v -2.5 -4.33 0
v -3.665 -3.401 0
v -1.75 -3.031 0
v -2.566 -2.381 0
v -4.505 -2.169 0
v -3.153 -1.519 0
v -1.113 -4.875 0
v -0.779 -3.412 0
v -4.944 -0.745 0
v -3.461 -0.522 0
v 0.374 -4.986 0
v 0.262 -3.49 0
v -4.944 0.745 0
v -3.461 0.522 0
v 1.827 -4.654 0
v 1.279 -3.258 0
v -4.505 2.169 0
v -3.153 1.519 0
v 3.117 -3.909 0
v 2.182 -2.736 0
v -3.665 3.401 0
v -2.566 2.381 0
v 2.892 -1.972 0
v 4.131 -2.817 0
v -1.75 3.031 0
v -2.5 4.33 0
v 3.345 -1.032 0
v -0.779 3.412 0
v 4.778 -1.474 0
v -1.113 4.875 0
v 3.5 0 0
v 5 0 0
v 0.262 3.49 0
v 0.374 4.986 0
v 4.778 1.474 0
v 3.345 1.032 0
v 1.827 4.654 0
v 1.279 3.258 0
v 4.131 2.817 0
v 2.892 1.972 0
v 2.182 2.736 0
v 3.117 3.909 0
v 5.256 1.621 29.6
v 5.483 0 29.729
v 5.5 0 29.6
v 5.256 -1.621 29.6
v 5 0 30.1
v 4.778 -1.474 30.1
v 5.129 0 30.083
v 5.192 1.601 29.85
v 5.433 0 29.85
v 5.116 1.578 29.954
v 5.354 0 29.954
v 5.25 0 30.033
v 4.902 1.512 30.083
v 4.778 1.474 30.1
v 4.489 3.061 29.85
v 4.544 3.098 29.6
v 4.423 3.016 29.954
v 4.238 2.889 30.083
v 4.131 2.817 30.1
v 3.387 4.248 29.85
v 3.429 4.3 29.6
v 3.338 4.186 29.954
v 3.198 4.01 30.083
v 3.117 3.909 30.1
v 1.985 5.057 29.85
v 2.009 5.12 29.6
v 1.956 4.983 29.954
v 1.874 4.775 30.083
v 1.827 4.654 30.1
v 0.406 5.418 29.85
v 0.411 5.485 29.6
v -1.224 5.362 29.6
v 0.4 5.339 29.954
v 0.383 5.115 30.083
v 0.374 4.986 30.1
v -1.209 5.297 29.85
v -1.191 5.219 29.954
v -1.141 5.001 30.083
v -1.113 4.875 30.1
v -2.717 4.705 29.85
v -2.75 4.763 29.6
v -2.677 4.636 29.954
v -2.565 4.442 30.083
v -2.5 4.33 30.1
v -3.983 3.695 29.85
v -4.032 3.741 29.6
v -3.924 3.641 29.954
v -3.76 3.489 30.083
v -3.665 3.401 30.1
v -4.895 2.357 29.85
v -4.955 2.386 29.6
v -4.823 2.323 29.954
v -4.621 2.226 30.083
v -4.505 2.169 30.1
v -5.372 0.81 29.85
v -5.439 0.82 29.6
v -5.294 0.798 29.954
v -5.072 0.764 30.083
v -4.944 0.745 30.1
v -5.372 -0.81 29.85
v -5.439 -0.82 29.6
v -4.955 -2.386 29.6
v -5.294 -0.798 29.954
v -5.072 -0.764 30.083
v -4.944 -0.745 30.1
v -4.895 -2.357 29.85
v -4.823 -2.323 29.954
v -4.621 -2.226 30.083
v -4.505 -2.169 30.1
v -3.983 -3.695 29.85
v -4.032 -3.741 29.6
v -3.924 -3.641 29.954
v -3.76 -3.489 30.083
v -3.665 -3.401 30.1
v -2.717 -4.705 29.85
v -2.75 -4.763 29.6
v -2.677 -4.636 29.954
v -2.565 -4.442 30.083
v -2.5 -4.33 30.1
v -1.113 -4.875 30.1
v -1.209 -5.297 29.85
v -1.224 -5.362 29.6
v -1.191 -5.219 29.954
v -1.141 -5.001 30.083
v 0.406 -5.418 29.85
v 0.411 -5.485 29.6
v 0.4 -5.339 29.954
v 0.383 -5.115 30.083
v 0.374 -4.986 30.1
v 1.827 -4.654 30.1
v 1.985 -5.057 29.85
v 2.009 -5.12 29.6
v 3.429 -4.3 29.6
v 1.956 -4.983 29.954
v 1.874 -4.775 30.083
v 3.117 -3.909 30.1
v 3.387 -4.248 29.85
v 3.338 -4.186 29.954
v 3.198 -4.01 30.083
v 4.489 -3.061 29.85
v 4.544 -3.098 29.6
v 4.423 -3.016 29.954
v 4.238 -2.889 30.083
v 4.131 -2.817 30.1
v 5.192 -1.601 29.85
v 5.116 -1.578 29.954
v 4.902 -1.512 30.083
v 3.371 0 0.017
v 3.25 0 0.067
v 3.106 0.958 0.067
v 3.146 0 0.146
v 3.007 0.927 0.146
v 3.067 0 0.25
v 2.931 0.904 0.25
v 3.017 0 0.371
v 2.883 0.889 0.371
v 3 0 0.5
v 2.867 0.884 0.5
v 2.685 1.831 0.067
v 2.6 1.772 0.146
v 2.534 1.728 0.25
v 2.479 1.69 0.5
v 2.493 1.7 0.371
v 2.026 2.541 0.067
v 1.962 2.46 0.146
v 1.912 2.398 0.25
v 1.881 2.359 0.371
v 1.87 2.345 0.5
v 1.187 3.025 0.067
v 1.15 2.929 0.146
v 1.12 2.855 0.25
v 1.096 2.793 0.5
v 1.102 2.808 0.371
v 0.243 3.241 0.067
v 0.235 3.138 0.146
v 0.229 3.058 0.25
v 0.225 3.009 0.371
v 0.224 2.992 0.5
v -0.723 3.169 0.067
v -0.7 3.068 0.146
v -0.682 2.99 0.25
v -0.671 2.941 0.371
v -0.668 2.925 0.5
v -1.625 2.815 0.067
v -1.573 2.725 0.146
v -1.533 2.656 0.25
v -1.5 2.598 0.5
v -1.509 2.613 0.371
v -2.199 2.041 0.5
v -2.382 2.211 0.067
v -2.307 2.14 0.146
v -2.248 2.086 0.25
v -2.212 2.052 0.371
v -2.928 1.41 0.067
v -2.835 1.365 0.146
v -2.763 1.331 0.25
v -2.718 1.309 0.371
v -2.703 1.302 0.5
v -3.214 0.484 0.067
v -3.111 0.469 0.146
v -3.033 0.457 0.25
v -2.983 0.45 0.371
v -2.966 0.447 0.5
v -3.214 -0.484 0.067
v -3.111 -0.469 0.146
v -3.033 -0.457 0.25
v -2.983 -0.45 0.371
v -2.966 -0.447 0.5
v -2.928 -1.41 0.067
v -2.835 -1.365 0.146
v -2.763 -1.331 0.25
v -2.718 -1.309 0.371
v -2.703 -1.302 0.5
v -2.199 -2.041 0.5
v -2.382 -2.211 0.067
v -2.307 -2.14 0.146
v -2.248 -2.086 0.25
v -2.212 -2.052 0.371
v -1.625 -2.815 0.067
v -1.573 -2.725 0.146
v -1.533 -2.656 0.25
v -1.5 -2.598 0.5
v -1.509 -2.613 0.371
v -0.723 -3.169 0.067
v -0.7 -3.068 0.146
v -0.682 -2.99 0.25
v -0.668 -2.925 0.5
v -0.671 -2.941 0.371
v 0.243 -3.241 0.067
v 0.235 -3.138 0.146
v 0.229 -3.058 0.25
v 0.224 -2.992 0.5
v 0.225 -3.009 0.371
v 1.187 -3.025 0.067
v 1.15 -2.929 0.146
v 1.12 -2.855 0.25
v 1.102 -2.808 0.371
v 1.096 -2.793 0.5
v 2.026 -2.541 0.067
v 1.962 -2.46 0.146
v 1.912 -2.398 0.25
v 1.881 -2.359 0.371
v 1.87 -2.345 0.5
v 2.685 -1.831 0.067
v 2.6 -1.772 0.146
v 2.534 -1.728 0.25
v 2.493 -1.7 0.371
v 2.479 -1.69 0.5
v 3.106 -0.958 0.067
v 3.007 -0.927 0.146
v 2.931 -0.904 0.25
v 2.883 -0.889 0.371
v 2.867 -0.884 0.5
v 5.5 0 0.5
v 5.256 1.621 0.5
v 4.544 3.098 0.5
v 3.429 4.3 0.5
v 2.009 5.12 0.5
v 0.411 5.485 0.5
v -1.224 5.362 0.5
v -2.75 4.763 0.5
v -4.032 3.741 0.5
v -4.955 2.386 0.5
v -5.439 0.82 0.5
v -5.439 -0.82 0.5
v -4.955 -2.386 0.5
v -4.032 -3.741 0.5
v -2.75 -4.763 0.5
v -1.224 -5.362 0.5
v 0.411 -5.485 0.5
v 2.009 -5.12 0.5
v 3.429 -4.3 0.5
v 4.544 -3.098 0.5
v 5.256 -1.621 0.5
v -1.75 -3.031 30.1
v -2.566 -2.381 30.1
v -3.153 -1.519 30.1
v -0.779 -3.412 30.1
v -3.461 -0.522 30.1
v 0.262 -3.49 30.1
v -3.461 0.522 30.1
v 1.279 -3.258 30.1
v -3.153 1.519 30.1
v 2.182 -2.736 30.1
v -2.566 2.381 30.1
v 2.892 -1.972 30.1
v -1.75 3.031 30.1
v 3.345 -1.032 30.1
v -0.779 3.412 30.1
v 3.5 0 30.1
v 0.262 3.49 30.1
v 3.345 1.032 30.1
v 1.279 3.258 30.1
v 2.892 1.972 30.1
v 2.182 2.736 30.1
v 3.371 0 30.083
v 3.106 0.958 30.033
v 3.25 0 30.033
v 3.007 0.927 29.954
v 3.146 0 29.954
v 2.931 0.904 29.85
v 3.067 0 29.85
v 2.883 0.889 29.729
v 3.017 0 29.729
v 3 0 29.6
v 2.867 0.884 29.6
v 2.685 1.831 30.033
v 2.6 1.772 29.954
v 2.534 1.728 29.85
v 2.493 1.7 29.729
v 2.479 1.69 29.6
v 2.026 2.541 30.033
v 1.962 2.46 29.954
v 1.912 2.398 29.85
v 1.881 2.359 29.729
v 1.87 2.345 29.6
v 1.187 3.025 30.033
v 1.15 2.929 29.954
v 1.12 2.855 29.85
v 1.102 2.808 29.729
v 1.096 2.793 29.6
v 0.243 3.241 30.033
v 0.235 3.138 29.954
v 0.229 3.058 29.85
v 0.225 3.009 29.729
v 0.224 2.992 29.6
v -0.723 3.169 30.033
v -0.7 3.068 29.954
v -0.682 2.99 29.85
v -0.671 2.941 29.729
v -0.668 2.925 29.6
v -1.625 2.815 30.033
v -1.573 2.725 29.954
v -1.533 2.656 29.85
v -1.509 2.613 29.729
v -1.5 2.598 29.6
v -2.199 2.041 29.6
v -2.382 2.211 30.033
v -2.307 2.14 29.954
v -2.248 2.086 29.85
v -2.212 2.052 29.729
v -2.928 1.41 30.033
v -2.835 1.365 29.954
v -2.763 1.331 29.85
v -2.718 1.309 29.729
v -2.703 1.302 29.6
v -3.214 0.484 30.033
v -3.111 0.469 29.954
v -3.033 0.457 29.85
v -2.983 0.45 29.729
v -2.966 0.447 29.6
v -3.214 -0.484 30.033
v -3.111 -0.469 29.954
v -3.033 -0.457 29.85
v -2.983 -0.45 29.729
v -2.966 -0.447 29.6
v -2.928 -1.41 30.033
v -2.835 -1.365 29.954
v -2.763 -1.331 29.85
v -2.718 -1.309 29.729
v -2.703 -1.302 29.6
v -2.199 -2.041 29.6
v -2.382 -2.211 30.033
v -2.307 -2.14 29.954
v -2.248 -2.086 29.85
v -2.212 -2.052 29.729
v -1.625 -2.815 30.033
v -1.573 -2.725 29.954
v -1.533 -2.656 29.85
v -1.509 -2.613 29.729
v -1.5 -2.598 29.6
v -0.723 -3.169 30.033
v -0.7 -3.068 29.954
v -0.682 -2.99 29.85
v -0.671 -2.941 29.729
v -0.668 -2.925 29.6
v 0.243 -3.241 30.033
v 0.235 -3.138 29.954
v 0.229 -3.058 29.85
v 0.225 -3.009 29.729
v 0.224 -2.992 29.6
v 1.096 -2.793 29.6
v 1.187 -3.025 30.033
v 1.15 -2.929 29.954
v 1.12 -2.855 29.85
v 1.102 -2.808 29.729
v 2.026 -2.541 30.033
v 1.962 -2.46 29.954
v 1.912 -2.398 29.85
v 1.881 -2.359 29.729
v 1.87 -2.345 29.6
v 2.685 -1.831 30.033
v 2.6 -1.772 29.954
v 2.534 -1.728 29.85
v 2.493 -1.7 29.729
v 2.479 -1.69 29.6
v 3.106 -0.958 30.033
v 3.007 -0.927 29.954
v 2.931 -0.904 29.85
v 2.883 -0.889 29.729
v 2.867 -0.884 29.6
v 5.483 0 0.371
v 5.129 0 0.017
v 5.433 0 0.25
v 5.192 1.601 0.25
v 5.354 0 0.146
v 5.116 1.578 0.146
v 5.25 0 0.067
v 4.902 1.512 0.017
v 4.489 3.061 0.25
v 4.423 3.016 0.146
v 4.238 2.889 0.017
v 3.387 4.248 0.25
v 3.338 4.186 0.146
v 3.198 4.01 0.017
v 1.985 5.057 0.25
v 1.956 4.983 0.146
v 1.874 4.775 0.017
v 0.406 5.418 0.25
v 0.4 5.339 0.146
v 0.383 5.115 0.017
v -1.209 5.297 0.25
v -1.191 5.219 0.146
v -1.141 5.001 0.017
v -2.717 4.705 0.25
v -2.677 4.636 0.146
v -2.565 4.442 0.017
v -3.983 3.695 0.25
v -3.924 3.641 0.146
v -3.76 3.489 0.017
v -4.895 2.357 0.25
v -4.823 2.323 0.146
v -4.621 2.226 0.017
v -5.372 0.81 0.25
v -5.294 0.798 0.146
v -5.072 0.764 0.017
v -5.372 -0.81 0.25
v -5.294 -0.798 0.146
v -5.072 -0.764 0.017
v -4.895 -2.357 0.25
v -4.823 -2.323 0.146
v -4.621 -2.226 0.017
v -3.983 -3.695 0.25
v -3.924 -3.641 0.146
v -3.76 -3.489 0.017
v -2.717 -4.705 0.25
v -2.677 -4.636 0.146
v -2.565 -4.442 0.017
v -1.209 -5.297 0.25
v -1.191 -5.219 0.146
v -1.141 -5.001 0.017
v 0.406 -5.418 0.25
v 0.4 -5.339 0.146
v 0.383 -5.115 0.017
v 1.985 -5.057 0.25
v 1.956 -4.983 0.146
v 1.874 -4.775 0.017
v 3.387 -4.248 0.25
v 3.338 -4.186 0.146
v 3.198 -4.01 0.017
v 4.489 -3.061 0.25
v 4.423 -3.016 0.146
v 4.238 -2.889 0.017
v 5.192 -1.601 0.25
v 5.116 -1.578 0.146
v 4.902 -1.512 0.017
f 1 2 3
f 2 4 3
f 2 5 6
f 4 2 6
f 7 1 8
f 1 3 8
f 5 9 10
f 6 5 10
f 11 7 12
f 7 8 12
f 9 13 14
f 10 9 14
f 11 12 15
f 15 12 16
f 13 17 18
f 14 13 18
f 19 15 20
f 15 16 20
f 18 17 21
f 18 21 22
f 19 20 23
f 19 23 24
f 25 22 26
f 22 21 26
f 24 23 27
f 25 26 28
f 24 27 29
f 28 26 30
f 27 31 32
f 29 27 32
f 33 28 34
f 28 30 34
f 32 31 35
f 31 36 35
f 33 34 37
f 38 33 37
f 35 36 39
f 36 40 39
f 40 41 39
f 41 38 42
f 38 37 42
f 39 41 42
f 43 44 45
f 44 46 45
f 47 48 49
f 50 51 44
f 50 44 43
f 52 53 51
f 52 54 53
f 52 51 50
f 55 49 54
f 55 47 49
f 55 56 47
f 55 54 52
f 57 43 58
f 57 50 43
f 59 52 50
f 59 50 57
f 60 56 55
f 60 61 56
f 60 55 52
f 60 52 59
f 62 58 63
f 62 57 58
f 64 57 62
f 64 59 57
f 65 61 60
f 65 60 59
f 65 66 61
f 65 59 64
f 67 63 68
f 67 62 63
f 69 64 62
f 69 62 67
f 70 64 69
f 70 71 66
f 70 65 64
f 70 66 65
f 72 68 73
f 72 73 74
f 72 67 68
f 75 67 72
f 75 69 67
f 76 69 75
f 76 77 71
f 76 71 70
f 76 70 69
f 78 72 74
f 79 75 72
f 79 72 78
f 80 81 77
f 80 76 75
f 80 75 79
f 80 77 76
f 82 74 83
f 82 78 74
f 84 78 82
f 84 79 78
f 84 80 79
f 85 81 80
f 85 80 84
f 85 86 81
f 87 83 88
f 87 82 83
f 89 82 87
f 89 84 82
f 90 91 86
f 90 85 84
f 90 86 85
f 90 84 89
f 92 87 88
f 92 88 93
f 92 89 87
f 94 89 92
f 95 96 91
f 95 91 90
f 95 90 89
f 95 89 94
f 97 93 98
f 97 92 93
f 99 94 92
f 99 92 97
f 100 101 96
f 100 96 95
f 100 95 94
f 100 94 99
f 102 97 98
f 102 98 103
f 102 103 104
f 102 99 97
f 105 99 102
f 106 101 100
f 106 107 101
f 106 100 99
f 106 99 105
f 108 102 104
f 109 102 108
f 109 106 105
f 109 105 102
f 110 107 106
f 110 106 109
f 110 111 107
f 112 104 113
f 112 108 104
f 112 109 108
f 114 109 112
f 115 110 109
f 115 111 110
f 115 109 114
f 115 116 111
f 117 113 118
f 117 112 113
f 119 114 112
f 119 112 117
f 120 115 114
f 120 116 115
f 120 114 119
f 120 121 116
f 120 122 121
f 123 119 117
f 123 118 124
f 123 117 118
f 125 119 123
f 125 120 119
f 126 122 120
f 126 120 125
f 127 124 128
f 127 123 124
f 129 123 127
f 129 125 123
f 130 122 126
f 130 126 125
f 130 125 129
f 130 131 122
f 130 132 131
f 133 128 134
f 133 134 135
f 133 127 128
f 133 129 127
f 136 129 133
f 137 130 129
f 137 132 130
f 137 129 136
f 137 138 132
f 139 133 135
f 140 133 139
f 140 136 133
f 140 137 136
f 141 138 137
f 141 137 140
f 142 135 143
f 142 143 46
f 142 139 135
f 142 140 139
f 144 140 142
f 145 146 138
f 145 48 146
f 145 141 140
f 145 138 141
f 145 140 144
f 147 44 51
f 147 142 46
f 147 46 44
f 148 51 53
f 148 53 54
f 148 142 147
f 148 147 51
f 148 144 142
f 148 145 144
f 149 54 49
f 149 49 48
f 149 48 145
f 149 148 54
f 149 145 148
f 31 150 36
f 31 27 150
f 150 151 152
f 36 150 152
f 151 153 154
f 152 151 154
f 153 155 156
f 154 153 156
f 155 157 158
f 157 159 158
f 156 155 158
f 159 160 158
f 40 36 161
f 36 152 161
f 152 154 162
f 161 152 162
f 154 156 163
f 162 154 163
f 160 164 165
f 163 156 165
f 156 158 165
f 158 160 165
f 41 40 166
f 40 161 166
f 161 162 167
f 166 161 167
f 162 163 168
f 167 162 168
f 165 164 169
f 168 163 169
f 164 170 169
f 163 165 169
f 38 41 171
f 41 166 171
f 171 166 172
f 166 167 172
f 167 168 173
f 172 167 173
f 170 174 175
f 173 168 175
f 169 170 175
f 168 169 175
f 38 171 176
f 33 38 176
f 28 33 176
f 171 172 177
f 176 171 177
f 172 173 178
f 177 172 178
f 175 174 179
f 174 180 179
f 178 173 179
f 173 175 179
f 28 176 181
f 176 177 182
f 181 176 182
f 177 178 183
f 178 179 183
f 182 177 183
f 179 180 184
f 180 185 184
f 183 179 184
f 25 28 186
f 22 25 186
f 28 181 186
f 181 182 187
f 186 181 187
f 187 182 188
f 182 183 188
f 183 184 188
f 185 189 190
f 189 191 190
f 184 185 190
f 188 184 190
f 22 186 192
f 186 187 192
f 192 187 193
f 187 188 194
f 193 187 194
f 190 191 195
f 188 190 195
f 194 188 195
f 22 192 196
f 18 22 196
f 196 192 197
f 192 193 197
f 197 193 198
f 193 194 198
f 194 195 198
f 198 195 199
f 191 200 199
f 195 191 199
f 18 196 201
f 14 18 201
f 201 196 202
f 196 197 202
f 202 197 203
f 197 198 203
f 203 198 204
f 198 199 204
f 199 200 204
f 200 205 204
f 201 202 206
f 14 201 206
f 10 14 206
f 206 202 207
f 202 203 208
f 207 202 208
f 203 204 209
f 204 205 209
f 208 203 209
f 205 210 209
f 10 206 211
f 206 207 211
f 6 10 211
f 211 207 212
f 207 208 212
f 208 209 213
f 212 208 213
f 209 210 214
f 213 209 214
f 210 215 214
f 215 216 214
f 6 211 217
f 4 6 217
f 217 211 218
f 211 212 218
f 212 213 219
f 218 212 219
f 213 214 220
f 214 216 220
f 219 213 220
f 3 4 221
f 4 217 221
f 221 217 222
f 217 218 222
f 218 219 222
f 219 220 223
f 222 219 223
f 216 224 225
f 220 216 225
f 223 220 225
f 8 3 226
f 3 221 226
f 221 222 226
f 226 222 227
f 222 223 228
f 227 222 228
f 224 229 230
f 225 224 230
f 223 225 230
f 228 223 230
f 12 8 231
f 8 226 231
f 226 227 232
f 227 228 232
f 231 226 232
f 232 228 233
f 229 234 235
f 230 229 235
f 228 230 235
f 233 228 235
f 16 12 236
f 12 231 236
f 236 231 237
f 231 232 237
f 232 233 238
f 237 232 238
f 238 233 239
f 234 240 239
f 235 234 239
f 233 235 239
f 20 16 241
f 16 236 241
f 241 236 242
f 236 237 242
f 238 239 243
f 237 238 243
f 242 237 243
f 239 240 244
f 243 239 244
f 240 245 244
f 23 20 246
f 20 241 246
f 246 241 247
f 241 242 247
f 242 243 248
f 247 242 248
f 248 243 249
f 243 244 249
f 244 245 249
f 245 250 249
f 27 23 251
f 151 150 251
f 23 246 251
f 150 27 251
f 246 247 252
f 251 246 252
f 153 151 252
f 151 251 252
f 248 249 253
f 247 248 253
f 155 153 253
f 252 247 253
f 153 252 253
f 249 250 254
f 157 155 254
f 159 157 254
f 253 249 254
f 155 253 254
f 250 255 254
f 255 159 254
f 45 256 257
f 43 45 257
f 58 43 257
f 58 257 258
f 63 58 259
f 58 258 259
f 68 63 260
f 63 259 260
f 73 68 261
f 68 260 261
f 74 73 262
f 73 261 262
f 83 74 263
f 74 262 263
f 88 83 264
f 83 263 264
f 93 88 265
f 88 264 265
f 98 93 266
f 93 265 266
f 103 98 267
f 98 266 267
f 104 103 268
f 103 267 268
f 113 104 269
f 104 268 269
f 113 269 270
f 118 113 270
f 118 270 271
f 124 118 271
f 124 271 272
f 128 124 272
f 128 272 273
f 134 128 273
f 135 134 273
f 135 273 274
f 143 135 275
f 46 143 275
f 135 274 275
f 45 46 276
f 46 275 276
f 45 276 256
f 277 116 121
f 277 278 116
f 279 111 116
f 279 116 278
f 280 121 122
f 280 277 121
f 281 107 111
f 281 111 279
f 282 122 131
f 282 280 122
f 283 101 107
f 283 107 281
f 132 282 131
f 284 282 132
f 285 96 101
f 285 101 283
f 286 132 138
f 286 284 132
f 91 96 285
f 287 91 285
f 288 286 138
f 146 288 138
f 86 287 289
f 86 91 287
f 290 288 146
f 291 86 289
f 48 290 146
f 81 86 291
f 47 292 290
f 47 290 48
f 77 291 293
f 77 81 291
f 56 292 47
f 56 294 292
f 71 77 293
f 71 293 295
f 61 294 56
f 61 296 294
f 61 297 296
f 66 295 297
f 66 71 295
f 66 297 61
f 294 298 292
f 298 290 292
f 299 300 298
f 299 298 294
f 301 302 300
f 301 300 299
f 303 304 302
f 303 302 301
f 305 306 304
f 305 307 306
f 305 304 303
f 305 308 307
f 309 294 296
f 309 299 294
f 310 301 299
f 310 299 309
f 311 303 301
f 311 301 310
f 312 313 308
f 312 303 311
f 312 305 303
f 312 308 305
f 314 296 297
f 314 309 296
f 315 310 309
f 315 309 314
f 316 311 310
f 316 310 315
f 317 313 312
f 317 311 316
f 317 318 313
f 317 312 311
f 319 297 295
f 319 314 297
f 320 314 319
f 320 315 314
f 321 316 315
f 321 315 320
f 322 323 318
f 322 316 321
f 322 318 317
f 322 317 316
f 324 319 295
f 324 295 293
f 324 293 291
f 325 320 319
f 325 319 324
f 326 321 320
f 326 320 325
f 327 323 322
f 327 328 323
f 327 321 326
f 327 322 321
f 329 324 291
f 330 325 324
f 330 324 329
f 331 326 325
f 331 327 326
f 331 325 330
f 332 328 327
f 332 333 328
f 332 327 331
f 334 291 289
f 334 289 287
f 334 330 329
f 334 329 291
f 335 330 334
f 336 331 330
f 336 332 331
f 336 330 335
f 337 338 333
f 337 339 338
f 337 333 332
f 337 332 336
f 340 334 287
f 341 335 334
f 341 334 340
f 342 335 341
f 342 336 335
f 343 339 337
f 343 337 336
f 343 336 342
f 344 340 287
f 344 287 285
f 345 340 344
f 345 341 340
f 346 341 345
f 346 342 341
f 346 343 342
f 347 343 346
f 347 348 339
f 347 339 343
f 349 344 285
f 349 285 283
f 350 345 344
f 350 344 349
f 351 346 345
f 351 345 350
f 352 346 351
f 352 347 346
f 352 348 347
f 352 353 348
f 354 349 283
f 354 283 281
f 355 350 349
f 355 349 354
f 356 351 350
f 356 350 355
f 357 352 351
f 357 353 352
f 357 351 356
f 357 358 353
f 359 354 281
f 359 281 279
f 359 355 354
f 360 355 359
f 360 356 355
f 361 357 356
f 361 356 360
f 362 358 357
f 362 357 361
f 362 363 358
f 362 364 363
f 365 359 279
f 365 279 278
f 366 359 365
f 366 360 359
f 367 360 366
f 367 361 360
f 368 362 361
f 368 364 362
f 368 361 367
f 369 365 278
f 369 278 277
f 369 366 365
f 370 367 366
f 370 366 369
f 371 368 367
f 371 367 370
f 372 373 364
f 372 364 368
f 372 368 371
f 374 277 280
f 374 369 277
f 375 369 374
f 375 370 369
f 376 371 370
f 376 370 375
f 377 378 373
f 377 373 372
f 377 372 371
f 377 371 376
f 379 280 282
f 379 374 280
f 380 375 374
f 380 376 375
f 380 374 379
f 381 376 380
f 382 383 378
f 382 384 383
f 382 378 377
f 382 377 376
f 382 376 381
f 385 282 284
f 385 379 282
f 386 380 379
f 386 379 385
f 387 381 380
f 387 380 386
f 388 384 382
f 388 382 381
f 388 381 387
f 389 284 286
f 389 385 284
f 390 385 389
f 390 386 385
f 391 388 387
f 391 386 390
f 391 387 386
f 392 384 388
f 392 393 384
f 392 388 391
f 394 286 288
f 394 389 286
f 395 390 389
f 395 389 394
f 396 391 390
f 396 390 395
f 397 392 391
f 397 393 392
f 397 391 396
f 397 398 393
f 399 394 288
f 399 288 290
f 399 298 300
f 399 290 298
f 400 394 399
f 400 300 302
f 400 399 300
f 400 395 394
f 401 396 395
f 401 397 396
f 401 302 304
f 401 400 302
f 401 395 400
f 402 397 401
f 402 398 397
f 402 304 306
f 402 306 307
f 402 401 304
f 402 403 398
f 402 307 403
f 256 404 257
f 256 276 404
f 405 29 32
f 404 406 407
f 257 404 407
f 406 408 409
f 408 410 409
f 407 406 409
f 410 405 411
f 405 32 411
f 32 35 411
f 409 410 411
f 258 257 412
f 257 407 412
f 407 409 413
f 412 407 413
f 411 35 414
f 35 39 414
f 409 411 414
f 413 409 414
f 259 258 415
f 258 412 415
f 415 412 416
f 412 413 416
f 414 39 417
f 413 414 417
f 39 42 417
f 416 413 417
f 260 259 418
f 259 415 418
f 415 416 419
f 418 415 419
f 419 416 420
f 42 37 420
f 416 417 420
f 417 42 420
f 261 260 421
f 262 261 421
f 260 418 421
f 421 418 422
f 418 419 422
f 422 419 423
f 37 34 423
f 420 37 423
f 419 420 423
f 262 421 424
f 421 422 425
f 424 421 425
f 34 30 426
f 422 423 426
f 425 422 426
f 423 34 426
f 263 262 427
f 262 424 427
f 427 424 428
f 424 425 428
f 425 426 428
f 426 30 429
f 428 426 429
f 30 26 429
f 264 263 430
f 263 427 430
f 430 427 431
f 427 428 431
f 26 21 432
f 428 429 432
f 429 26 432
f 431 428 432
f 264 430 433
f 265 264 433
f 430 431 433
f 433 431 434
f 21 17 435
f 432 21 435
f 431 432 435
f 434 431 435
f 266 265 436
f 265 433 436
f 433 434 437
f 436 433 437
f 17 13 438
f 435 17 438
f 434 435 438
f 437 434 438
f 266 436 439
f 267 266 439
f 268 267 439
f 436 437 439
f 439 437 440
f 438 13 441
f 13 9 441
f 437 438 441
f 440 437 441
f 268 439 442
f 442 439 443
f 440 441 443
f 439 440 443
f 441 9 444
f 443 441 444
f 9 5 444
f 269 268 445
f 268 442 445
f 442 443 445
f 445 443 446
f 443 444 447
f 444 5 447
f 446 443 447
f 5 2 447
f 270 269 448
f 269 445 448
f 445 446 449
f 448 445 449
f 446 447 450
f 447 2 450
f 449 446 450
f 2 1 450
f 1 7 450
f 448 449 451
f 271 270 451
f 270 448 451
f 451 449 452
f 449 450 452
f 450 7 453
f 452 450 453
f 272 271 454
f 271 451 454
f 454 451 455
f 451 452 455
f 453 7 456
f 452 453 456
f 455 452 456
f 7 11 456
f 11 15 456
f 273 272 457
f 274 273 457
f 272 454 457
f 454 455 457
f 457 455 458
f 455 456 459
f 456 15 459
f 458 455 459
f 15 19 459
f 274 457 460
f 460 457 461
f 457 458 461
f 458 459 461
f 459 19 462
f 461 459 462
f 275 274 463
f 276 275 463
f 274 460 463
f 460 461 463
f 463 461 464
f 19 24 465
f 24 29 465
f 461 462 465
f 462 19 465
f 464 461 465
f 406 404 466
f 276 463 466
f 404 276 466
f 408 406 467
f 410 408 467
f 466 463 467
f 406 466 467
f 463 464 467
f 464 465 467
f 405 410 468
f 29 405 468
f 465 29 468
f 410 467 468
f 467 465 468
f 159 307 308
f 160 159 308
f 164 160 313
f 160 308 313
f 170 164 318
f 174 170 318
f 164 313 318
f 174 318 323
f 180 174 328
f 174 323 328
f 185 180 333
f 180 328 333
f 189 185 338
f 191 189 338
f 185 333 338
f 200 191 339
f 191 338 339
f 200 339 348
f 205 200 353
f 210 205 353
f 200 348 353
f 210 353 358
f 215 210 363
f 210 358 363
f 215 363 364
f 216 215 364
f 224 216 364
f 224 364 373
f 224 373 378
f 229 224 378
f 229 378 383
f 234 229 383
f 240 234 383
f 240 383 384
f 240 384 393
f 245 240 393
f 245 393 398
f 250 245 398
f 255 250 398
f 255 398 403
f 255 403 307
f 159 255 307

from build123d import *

# Parameters (mm, degrees)
SKETCH1_R           = 5.5
BOSS_EXTRUDE1_DEPTH = 30.1
SKETCH2_R           = 3
CUT_EXTRUDE1_DEPTH  = 31.1
FILLET1_R           = 0.5


with BuildPart() as part:
    # Sketch1 → Boss-Extrude1 (new body)
    with BuildSketch(Plane.XY):
        Circle(SKETCH1_R)
    extrude(amount=BOSS_EXTRUDE1_DEPTH)

    # Sketch2 → Cut-Extrude1 (cut, through all)
    with BuildSketch(Plane.XY.offset(30.1)):
        Circle(SKETCH2_R)
    extrude(amount=-CUT_EXTRUDE1_DEPTH, mode=Mode.SUBTRACT)

    # Fillet1
    fillet1_edges = [part.edges().sort_by_distance(p)[0] for p in [
        (-5.5, 0, 0),
        (-5.5, 0, 30.1),
        (-3, 0, 0),
        (-3, 0, 30.1),
    ]]
    fillet(fillet1_edges, radius=FILLET1_R)


solid = part.part
